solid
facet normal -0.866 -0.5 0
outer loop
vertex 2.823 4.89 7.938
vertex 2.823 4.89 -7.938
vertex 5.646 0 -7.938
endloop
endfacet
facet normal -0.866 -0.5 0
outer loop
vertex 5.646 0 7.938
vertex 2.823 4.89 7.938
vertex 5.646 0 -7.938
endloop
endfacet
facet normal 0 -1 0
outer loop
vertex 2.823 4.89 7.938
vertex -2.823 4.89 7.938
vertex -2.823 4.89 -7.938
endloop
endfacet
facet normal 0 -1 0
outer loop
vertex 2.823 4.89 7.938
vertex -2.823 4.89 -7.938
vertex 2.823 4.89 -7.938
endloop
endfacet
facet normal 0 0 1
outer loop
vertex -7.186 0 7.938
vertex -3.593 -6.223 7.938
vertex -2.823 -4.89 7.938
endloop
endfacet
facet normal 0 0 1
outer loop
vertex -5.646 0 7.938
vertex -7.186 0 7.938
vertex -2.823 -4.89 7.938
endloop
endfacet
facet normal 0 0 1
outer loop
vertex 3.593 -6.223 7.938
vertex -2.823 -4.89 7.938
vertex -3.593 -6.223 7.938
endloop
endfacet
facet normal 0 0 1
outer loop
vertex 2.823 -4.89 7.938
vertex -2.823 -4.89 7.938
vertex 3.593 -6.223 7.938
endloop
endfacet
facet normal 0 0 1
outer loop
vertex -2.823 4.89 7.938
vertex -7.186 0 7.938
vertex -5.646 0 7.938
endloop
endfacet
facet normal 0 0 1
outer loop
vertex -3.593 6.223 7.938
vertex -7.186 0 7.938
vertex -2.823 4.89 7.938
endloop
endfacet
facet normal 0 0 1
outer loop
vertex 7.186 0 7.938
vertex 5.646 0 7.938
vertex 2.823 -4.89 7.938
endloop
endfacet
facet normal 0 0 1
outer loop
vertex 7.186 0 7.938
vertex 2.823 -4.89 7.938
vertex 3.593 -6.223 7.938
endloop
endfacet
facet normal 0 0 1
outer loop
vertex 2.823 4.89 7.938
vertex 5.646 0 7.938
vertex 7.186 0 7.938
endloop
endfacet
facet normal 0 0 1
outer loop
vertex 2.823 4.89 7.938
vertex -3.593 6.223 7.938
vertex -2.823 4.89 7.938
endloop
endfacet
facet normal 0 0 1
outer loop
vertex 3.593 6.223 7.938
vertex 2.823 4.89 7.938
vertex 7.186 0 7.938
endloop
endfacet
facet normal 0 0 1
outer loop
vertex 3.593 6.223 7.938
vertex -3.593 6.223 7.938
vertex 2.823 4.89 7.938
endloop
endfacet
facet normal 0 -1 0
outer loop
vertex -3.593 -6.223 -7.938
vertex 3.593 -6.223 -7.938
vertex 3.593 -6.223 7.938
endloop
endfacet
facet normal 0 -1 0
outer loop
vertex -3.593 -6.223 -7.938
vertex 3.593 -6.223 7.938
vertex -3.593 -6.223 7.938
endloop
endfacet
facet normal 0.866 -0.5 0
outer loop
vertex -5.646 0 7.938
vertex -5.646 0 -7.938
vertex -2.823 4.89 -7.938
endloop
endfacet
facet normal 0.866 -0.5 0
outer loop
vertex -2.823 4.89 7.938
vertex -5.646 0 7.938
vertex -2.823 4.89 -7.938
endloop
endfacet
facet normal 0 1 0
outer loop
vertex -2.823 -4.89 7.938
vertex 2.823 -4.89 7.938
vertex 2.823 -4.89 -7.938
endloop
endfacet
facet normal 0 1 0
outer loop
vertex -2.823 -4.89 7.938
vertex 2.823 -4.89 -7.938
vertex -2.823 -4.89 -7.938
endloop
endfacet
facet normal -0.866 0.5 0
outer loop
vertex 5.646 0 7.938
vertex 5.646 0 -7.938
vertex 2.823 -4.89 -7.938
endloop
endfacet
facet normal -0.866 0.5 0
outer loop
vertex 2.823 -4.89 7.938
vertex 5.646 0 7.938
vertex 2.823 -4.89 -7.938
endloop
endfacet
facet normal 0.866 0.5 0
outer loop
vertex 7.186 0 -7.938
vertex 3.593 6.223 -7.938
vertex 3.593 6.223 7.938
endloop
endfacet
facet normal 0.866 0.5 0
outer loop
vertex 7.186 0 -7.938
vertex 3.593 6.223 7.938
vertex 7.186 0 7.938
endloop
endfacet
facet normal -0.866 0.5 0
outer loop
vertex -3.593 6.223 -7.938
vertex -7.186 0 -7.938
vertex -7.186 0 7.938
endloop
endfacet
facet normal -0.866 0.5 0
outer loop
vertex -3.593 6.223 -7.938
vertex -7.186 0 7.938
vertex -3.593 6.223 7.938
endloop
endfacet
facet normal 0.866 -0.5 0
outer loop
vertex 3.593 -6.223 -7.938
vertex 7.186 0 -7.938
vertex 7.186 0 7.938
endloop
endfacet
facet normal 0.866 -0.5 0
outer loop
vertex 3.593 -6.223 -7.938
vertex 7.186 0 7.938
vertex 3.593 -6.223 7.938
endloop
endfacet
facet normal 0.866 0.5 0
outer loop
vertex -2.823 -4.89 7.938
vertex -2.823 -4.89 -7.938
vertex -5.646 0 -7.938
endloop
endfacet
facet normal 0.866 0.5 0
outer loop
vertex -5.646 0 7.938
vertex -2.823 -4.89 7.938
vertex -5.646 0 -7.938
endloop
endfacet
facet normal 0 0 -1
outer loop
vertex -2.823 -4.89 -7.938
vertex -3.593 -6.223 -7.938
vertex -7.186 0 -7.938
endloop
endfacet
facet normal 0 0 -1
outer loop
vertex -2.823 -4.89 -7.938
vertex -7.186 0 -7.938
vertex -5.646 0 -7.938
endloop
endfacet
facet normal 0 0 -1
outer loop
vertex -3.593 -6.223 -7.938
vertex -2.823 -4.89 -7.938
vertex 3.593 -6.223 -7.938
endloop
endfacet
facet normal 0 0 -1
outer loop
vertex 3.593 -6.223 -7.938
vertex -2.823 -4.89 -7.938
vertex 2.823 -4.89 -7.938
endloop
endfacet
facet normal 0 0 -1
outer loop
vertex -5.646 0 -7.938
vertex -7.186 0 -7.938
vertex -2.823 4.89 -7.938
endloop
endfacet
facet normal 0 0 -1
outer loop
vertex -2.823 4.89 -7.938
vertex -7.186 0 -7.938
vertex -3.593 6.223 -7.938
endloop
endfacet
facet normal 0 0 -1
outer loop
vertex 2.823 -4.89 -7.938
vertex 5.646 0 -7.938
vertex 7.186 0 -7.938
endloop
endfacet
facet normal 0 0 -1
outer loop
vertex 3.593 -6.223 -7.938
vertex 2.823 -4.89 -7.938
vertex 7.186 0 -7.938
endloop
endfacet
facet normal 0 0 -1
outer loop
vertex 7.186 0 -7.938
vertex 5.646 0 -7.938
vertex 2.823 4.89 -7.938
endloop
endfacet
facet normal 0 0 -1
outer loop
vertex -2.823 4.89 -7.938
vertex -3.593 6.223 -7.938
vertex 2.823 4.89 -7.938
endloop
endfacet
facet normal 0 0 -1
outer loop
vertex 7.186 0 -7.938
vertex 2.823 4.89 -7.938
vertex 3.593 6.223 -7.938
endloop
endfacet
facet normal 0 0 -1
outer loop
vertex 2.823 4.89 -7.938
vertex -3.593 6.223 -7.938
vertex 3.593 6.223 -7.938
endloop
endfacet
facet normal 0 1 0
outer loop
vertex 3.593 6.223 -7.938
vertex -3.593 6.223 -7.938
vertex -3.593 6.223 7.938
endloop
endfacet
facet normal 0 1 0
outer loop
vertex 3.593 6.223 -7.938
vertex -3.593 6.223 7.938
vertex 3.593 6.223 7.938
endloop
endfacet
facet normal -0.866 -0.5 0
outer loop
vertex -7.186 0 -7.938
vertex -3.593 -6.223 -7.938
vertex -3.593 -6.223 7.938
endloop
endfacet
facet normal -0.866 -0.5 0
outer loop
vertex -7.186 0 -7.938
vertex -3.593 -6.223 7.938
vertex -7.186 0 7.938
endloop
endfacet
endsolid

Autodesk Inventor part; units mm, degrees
ref_plane "YZ Plane" through (0, 0, 0) normal (1, 0, 0) x (0, 1, 0)
ref_plane "XZ Plane" through (0, 0, 0) normal (0, 1, 0) x (-1, 0, 0)
ref_plane "XY Plane" through (0, 0, 0) normal (0, 0, 1) x (1, 0, 0)
sketch "Sketch1" plane through (0, 0, 0) normal (0, 0, 1) x (1, 0, 0)
  line L0 (3.5929, 6.223) -> (7.1857, 0)
  line L1 (7.1857, 0) -> (3.5929, -6.223)
  line L2 (3.5929, -6.223) -> (-3.5929, -6.223)
  line L3 (-3.5929, -6.223) -> (-7.1857, 0)
  line L4 (-7.1857, 0) -> (-3.5929, 6.223)
  line L5 (-3.5929, 6.223) -> (3.5929, 6.223)
  line L6 (2.823, 4.8895) -> (5.6459, 0)
  line L7 (5.6459, 0) -> (2.823, -4.8895)
  line L8 (2.823, -4.8895) -> (-2.823, -4.8895)
  line L9 (-2.823, -4.8895) -> (-5.6459, 0)
  line L10 (-5.6459, 0) -> (-2.823, 4.8895)
  line L11 (-2.823, 4.8895) -> (2.823, 4.8895)
  point P0 (0, 0)
  point P1 (0, 0)
  point P2 (0, 0)
  dimension "d0" = 12.446
  dimension "d1" = 9.779
extrude "Extrusion1" add sketch "Sketch1" along normal mid plane 15.875
properties part number "1-2 TO 3-8 ADAPTER" material "ABS Plastic"
